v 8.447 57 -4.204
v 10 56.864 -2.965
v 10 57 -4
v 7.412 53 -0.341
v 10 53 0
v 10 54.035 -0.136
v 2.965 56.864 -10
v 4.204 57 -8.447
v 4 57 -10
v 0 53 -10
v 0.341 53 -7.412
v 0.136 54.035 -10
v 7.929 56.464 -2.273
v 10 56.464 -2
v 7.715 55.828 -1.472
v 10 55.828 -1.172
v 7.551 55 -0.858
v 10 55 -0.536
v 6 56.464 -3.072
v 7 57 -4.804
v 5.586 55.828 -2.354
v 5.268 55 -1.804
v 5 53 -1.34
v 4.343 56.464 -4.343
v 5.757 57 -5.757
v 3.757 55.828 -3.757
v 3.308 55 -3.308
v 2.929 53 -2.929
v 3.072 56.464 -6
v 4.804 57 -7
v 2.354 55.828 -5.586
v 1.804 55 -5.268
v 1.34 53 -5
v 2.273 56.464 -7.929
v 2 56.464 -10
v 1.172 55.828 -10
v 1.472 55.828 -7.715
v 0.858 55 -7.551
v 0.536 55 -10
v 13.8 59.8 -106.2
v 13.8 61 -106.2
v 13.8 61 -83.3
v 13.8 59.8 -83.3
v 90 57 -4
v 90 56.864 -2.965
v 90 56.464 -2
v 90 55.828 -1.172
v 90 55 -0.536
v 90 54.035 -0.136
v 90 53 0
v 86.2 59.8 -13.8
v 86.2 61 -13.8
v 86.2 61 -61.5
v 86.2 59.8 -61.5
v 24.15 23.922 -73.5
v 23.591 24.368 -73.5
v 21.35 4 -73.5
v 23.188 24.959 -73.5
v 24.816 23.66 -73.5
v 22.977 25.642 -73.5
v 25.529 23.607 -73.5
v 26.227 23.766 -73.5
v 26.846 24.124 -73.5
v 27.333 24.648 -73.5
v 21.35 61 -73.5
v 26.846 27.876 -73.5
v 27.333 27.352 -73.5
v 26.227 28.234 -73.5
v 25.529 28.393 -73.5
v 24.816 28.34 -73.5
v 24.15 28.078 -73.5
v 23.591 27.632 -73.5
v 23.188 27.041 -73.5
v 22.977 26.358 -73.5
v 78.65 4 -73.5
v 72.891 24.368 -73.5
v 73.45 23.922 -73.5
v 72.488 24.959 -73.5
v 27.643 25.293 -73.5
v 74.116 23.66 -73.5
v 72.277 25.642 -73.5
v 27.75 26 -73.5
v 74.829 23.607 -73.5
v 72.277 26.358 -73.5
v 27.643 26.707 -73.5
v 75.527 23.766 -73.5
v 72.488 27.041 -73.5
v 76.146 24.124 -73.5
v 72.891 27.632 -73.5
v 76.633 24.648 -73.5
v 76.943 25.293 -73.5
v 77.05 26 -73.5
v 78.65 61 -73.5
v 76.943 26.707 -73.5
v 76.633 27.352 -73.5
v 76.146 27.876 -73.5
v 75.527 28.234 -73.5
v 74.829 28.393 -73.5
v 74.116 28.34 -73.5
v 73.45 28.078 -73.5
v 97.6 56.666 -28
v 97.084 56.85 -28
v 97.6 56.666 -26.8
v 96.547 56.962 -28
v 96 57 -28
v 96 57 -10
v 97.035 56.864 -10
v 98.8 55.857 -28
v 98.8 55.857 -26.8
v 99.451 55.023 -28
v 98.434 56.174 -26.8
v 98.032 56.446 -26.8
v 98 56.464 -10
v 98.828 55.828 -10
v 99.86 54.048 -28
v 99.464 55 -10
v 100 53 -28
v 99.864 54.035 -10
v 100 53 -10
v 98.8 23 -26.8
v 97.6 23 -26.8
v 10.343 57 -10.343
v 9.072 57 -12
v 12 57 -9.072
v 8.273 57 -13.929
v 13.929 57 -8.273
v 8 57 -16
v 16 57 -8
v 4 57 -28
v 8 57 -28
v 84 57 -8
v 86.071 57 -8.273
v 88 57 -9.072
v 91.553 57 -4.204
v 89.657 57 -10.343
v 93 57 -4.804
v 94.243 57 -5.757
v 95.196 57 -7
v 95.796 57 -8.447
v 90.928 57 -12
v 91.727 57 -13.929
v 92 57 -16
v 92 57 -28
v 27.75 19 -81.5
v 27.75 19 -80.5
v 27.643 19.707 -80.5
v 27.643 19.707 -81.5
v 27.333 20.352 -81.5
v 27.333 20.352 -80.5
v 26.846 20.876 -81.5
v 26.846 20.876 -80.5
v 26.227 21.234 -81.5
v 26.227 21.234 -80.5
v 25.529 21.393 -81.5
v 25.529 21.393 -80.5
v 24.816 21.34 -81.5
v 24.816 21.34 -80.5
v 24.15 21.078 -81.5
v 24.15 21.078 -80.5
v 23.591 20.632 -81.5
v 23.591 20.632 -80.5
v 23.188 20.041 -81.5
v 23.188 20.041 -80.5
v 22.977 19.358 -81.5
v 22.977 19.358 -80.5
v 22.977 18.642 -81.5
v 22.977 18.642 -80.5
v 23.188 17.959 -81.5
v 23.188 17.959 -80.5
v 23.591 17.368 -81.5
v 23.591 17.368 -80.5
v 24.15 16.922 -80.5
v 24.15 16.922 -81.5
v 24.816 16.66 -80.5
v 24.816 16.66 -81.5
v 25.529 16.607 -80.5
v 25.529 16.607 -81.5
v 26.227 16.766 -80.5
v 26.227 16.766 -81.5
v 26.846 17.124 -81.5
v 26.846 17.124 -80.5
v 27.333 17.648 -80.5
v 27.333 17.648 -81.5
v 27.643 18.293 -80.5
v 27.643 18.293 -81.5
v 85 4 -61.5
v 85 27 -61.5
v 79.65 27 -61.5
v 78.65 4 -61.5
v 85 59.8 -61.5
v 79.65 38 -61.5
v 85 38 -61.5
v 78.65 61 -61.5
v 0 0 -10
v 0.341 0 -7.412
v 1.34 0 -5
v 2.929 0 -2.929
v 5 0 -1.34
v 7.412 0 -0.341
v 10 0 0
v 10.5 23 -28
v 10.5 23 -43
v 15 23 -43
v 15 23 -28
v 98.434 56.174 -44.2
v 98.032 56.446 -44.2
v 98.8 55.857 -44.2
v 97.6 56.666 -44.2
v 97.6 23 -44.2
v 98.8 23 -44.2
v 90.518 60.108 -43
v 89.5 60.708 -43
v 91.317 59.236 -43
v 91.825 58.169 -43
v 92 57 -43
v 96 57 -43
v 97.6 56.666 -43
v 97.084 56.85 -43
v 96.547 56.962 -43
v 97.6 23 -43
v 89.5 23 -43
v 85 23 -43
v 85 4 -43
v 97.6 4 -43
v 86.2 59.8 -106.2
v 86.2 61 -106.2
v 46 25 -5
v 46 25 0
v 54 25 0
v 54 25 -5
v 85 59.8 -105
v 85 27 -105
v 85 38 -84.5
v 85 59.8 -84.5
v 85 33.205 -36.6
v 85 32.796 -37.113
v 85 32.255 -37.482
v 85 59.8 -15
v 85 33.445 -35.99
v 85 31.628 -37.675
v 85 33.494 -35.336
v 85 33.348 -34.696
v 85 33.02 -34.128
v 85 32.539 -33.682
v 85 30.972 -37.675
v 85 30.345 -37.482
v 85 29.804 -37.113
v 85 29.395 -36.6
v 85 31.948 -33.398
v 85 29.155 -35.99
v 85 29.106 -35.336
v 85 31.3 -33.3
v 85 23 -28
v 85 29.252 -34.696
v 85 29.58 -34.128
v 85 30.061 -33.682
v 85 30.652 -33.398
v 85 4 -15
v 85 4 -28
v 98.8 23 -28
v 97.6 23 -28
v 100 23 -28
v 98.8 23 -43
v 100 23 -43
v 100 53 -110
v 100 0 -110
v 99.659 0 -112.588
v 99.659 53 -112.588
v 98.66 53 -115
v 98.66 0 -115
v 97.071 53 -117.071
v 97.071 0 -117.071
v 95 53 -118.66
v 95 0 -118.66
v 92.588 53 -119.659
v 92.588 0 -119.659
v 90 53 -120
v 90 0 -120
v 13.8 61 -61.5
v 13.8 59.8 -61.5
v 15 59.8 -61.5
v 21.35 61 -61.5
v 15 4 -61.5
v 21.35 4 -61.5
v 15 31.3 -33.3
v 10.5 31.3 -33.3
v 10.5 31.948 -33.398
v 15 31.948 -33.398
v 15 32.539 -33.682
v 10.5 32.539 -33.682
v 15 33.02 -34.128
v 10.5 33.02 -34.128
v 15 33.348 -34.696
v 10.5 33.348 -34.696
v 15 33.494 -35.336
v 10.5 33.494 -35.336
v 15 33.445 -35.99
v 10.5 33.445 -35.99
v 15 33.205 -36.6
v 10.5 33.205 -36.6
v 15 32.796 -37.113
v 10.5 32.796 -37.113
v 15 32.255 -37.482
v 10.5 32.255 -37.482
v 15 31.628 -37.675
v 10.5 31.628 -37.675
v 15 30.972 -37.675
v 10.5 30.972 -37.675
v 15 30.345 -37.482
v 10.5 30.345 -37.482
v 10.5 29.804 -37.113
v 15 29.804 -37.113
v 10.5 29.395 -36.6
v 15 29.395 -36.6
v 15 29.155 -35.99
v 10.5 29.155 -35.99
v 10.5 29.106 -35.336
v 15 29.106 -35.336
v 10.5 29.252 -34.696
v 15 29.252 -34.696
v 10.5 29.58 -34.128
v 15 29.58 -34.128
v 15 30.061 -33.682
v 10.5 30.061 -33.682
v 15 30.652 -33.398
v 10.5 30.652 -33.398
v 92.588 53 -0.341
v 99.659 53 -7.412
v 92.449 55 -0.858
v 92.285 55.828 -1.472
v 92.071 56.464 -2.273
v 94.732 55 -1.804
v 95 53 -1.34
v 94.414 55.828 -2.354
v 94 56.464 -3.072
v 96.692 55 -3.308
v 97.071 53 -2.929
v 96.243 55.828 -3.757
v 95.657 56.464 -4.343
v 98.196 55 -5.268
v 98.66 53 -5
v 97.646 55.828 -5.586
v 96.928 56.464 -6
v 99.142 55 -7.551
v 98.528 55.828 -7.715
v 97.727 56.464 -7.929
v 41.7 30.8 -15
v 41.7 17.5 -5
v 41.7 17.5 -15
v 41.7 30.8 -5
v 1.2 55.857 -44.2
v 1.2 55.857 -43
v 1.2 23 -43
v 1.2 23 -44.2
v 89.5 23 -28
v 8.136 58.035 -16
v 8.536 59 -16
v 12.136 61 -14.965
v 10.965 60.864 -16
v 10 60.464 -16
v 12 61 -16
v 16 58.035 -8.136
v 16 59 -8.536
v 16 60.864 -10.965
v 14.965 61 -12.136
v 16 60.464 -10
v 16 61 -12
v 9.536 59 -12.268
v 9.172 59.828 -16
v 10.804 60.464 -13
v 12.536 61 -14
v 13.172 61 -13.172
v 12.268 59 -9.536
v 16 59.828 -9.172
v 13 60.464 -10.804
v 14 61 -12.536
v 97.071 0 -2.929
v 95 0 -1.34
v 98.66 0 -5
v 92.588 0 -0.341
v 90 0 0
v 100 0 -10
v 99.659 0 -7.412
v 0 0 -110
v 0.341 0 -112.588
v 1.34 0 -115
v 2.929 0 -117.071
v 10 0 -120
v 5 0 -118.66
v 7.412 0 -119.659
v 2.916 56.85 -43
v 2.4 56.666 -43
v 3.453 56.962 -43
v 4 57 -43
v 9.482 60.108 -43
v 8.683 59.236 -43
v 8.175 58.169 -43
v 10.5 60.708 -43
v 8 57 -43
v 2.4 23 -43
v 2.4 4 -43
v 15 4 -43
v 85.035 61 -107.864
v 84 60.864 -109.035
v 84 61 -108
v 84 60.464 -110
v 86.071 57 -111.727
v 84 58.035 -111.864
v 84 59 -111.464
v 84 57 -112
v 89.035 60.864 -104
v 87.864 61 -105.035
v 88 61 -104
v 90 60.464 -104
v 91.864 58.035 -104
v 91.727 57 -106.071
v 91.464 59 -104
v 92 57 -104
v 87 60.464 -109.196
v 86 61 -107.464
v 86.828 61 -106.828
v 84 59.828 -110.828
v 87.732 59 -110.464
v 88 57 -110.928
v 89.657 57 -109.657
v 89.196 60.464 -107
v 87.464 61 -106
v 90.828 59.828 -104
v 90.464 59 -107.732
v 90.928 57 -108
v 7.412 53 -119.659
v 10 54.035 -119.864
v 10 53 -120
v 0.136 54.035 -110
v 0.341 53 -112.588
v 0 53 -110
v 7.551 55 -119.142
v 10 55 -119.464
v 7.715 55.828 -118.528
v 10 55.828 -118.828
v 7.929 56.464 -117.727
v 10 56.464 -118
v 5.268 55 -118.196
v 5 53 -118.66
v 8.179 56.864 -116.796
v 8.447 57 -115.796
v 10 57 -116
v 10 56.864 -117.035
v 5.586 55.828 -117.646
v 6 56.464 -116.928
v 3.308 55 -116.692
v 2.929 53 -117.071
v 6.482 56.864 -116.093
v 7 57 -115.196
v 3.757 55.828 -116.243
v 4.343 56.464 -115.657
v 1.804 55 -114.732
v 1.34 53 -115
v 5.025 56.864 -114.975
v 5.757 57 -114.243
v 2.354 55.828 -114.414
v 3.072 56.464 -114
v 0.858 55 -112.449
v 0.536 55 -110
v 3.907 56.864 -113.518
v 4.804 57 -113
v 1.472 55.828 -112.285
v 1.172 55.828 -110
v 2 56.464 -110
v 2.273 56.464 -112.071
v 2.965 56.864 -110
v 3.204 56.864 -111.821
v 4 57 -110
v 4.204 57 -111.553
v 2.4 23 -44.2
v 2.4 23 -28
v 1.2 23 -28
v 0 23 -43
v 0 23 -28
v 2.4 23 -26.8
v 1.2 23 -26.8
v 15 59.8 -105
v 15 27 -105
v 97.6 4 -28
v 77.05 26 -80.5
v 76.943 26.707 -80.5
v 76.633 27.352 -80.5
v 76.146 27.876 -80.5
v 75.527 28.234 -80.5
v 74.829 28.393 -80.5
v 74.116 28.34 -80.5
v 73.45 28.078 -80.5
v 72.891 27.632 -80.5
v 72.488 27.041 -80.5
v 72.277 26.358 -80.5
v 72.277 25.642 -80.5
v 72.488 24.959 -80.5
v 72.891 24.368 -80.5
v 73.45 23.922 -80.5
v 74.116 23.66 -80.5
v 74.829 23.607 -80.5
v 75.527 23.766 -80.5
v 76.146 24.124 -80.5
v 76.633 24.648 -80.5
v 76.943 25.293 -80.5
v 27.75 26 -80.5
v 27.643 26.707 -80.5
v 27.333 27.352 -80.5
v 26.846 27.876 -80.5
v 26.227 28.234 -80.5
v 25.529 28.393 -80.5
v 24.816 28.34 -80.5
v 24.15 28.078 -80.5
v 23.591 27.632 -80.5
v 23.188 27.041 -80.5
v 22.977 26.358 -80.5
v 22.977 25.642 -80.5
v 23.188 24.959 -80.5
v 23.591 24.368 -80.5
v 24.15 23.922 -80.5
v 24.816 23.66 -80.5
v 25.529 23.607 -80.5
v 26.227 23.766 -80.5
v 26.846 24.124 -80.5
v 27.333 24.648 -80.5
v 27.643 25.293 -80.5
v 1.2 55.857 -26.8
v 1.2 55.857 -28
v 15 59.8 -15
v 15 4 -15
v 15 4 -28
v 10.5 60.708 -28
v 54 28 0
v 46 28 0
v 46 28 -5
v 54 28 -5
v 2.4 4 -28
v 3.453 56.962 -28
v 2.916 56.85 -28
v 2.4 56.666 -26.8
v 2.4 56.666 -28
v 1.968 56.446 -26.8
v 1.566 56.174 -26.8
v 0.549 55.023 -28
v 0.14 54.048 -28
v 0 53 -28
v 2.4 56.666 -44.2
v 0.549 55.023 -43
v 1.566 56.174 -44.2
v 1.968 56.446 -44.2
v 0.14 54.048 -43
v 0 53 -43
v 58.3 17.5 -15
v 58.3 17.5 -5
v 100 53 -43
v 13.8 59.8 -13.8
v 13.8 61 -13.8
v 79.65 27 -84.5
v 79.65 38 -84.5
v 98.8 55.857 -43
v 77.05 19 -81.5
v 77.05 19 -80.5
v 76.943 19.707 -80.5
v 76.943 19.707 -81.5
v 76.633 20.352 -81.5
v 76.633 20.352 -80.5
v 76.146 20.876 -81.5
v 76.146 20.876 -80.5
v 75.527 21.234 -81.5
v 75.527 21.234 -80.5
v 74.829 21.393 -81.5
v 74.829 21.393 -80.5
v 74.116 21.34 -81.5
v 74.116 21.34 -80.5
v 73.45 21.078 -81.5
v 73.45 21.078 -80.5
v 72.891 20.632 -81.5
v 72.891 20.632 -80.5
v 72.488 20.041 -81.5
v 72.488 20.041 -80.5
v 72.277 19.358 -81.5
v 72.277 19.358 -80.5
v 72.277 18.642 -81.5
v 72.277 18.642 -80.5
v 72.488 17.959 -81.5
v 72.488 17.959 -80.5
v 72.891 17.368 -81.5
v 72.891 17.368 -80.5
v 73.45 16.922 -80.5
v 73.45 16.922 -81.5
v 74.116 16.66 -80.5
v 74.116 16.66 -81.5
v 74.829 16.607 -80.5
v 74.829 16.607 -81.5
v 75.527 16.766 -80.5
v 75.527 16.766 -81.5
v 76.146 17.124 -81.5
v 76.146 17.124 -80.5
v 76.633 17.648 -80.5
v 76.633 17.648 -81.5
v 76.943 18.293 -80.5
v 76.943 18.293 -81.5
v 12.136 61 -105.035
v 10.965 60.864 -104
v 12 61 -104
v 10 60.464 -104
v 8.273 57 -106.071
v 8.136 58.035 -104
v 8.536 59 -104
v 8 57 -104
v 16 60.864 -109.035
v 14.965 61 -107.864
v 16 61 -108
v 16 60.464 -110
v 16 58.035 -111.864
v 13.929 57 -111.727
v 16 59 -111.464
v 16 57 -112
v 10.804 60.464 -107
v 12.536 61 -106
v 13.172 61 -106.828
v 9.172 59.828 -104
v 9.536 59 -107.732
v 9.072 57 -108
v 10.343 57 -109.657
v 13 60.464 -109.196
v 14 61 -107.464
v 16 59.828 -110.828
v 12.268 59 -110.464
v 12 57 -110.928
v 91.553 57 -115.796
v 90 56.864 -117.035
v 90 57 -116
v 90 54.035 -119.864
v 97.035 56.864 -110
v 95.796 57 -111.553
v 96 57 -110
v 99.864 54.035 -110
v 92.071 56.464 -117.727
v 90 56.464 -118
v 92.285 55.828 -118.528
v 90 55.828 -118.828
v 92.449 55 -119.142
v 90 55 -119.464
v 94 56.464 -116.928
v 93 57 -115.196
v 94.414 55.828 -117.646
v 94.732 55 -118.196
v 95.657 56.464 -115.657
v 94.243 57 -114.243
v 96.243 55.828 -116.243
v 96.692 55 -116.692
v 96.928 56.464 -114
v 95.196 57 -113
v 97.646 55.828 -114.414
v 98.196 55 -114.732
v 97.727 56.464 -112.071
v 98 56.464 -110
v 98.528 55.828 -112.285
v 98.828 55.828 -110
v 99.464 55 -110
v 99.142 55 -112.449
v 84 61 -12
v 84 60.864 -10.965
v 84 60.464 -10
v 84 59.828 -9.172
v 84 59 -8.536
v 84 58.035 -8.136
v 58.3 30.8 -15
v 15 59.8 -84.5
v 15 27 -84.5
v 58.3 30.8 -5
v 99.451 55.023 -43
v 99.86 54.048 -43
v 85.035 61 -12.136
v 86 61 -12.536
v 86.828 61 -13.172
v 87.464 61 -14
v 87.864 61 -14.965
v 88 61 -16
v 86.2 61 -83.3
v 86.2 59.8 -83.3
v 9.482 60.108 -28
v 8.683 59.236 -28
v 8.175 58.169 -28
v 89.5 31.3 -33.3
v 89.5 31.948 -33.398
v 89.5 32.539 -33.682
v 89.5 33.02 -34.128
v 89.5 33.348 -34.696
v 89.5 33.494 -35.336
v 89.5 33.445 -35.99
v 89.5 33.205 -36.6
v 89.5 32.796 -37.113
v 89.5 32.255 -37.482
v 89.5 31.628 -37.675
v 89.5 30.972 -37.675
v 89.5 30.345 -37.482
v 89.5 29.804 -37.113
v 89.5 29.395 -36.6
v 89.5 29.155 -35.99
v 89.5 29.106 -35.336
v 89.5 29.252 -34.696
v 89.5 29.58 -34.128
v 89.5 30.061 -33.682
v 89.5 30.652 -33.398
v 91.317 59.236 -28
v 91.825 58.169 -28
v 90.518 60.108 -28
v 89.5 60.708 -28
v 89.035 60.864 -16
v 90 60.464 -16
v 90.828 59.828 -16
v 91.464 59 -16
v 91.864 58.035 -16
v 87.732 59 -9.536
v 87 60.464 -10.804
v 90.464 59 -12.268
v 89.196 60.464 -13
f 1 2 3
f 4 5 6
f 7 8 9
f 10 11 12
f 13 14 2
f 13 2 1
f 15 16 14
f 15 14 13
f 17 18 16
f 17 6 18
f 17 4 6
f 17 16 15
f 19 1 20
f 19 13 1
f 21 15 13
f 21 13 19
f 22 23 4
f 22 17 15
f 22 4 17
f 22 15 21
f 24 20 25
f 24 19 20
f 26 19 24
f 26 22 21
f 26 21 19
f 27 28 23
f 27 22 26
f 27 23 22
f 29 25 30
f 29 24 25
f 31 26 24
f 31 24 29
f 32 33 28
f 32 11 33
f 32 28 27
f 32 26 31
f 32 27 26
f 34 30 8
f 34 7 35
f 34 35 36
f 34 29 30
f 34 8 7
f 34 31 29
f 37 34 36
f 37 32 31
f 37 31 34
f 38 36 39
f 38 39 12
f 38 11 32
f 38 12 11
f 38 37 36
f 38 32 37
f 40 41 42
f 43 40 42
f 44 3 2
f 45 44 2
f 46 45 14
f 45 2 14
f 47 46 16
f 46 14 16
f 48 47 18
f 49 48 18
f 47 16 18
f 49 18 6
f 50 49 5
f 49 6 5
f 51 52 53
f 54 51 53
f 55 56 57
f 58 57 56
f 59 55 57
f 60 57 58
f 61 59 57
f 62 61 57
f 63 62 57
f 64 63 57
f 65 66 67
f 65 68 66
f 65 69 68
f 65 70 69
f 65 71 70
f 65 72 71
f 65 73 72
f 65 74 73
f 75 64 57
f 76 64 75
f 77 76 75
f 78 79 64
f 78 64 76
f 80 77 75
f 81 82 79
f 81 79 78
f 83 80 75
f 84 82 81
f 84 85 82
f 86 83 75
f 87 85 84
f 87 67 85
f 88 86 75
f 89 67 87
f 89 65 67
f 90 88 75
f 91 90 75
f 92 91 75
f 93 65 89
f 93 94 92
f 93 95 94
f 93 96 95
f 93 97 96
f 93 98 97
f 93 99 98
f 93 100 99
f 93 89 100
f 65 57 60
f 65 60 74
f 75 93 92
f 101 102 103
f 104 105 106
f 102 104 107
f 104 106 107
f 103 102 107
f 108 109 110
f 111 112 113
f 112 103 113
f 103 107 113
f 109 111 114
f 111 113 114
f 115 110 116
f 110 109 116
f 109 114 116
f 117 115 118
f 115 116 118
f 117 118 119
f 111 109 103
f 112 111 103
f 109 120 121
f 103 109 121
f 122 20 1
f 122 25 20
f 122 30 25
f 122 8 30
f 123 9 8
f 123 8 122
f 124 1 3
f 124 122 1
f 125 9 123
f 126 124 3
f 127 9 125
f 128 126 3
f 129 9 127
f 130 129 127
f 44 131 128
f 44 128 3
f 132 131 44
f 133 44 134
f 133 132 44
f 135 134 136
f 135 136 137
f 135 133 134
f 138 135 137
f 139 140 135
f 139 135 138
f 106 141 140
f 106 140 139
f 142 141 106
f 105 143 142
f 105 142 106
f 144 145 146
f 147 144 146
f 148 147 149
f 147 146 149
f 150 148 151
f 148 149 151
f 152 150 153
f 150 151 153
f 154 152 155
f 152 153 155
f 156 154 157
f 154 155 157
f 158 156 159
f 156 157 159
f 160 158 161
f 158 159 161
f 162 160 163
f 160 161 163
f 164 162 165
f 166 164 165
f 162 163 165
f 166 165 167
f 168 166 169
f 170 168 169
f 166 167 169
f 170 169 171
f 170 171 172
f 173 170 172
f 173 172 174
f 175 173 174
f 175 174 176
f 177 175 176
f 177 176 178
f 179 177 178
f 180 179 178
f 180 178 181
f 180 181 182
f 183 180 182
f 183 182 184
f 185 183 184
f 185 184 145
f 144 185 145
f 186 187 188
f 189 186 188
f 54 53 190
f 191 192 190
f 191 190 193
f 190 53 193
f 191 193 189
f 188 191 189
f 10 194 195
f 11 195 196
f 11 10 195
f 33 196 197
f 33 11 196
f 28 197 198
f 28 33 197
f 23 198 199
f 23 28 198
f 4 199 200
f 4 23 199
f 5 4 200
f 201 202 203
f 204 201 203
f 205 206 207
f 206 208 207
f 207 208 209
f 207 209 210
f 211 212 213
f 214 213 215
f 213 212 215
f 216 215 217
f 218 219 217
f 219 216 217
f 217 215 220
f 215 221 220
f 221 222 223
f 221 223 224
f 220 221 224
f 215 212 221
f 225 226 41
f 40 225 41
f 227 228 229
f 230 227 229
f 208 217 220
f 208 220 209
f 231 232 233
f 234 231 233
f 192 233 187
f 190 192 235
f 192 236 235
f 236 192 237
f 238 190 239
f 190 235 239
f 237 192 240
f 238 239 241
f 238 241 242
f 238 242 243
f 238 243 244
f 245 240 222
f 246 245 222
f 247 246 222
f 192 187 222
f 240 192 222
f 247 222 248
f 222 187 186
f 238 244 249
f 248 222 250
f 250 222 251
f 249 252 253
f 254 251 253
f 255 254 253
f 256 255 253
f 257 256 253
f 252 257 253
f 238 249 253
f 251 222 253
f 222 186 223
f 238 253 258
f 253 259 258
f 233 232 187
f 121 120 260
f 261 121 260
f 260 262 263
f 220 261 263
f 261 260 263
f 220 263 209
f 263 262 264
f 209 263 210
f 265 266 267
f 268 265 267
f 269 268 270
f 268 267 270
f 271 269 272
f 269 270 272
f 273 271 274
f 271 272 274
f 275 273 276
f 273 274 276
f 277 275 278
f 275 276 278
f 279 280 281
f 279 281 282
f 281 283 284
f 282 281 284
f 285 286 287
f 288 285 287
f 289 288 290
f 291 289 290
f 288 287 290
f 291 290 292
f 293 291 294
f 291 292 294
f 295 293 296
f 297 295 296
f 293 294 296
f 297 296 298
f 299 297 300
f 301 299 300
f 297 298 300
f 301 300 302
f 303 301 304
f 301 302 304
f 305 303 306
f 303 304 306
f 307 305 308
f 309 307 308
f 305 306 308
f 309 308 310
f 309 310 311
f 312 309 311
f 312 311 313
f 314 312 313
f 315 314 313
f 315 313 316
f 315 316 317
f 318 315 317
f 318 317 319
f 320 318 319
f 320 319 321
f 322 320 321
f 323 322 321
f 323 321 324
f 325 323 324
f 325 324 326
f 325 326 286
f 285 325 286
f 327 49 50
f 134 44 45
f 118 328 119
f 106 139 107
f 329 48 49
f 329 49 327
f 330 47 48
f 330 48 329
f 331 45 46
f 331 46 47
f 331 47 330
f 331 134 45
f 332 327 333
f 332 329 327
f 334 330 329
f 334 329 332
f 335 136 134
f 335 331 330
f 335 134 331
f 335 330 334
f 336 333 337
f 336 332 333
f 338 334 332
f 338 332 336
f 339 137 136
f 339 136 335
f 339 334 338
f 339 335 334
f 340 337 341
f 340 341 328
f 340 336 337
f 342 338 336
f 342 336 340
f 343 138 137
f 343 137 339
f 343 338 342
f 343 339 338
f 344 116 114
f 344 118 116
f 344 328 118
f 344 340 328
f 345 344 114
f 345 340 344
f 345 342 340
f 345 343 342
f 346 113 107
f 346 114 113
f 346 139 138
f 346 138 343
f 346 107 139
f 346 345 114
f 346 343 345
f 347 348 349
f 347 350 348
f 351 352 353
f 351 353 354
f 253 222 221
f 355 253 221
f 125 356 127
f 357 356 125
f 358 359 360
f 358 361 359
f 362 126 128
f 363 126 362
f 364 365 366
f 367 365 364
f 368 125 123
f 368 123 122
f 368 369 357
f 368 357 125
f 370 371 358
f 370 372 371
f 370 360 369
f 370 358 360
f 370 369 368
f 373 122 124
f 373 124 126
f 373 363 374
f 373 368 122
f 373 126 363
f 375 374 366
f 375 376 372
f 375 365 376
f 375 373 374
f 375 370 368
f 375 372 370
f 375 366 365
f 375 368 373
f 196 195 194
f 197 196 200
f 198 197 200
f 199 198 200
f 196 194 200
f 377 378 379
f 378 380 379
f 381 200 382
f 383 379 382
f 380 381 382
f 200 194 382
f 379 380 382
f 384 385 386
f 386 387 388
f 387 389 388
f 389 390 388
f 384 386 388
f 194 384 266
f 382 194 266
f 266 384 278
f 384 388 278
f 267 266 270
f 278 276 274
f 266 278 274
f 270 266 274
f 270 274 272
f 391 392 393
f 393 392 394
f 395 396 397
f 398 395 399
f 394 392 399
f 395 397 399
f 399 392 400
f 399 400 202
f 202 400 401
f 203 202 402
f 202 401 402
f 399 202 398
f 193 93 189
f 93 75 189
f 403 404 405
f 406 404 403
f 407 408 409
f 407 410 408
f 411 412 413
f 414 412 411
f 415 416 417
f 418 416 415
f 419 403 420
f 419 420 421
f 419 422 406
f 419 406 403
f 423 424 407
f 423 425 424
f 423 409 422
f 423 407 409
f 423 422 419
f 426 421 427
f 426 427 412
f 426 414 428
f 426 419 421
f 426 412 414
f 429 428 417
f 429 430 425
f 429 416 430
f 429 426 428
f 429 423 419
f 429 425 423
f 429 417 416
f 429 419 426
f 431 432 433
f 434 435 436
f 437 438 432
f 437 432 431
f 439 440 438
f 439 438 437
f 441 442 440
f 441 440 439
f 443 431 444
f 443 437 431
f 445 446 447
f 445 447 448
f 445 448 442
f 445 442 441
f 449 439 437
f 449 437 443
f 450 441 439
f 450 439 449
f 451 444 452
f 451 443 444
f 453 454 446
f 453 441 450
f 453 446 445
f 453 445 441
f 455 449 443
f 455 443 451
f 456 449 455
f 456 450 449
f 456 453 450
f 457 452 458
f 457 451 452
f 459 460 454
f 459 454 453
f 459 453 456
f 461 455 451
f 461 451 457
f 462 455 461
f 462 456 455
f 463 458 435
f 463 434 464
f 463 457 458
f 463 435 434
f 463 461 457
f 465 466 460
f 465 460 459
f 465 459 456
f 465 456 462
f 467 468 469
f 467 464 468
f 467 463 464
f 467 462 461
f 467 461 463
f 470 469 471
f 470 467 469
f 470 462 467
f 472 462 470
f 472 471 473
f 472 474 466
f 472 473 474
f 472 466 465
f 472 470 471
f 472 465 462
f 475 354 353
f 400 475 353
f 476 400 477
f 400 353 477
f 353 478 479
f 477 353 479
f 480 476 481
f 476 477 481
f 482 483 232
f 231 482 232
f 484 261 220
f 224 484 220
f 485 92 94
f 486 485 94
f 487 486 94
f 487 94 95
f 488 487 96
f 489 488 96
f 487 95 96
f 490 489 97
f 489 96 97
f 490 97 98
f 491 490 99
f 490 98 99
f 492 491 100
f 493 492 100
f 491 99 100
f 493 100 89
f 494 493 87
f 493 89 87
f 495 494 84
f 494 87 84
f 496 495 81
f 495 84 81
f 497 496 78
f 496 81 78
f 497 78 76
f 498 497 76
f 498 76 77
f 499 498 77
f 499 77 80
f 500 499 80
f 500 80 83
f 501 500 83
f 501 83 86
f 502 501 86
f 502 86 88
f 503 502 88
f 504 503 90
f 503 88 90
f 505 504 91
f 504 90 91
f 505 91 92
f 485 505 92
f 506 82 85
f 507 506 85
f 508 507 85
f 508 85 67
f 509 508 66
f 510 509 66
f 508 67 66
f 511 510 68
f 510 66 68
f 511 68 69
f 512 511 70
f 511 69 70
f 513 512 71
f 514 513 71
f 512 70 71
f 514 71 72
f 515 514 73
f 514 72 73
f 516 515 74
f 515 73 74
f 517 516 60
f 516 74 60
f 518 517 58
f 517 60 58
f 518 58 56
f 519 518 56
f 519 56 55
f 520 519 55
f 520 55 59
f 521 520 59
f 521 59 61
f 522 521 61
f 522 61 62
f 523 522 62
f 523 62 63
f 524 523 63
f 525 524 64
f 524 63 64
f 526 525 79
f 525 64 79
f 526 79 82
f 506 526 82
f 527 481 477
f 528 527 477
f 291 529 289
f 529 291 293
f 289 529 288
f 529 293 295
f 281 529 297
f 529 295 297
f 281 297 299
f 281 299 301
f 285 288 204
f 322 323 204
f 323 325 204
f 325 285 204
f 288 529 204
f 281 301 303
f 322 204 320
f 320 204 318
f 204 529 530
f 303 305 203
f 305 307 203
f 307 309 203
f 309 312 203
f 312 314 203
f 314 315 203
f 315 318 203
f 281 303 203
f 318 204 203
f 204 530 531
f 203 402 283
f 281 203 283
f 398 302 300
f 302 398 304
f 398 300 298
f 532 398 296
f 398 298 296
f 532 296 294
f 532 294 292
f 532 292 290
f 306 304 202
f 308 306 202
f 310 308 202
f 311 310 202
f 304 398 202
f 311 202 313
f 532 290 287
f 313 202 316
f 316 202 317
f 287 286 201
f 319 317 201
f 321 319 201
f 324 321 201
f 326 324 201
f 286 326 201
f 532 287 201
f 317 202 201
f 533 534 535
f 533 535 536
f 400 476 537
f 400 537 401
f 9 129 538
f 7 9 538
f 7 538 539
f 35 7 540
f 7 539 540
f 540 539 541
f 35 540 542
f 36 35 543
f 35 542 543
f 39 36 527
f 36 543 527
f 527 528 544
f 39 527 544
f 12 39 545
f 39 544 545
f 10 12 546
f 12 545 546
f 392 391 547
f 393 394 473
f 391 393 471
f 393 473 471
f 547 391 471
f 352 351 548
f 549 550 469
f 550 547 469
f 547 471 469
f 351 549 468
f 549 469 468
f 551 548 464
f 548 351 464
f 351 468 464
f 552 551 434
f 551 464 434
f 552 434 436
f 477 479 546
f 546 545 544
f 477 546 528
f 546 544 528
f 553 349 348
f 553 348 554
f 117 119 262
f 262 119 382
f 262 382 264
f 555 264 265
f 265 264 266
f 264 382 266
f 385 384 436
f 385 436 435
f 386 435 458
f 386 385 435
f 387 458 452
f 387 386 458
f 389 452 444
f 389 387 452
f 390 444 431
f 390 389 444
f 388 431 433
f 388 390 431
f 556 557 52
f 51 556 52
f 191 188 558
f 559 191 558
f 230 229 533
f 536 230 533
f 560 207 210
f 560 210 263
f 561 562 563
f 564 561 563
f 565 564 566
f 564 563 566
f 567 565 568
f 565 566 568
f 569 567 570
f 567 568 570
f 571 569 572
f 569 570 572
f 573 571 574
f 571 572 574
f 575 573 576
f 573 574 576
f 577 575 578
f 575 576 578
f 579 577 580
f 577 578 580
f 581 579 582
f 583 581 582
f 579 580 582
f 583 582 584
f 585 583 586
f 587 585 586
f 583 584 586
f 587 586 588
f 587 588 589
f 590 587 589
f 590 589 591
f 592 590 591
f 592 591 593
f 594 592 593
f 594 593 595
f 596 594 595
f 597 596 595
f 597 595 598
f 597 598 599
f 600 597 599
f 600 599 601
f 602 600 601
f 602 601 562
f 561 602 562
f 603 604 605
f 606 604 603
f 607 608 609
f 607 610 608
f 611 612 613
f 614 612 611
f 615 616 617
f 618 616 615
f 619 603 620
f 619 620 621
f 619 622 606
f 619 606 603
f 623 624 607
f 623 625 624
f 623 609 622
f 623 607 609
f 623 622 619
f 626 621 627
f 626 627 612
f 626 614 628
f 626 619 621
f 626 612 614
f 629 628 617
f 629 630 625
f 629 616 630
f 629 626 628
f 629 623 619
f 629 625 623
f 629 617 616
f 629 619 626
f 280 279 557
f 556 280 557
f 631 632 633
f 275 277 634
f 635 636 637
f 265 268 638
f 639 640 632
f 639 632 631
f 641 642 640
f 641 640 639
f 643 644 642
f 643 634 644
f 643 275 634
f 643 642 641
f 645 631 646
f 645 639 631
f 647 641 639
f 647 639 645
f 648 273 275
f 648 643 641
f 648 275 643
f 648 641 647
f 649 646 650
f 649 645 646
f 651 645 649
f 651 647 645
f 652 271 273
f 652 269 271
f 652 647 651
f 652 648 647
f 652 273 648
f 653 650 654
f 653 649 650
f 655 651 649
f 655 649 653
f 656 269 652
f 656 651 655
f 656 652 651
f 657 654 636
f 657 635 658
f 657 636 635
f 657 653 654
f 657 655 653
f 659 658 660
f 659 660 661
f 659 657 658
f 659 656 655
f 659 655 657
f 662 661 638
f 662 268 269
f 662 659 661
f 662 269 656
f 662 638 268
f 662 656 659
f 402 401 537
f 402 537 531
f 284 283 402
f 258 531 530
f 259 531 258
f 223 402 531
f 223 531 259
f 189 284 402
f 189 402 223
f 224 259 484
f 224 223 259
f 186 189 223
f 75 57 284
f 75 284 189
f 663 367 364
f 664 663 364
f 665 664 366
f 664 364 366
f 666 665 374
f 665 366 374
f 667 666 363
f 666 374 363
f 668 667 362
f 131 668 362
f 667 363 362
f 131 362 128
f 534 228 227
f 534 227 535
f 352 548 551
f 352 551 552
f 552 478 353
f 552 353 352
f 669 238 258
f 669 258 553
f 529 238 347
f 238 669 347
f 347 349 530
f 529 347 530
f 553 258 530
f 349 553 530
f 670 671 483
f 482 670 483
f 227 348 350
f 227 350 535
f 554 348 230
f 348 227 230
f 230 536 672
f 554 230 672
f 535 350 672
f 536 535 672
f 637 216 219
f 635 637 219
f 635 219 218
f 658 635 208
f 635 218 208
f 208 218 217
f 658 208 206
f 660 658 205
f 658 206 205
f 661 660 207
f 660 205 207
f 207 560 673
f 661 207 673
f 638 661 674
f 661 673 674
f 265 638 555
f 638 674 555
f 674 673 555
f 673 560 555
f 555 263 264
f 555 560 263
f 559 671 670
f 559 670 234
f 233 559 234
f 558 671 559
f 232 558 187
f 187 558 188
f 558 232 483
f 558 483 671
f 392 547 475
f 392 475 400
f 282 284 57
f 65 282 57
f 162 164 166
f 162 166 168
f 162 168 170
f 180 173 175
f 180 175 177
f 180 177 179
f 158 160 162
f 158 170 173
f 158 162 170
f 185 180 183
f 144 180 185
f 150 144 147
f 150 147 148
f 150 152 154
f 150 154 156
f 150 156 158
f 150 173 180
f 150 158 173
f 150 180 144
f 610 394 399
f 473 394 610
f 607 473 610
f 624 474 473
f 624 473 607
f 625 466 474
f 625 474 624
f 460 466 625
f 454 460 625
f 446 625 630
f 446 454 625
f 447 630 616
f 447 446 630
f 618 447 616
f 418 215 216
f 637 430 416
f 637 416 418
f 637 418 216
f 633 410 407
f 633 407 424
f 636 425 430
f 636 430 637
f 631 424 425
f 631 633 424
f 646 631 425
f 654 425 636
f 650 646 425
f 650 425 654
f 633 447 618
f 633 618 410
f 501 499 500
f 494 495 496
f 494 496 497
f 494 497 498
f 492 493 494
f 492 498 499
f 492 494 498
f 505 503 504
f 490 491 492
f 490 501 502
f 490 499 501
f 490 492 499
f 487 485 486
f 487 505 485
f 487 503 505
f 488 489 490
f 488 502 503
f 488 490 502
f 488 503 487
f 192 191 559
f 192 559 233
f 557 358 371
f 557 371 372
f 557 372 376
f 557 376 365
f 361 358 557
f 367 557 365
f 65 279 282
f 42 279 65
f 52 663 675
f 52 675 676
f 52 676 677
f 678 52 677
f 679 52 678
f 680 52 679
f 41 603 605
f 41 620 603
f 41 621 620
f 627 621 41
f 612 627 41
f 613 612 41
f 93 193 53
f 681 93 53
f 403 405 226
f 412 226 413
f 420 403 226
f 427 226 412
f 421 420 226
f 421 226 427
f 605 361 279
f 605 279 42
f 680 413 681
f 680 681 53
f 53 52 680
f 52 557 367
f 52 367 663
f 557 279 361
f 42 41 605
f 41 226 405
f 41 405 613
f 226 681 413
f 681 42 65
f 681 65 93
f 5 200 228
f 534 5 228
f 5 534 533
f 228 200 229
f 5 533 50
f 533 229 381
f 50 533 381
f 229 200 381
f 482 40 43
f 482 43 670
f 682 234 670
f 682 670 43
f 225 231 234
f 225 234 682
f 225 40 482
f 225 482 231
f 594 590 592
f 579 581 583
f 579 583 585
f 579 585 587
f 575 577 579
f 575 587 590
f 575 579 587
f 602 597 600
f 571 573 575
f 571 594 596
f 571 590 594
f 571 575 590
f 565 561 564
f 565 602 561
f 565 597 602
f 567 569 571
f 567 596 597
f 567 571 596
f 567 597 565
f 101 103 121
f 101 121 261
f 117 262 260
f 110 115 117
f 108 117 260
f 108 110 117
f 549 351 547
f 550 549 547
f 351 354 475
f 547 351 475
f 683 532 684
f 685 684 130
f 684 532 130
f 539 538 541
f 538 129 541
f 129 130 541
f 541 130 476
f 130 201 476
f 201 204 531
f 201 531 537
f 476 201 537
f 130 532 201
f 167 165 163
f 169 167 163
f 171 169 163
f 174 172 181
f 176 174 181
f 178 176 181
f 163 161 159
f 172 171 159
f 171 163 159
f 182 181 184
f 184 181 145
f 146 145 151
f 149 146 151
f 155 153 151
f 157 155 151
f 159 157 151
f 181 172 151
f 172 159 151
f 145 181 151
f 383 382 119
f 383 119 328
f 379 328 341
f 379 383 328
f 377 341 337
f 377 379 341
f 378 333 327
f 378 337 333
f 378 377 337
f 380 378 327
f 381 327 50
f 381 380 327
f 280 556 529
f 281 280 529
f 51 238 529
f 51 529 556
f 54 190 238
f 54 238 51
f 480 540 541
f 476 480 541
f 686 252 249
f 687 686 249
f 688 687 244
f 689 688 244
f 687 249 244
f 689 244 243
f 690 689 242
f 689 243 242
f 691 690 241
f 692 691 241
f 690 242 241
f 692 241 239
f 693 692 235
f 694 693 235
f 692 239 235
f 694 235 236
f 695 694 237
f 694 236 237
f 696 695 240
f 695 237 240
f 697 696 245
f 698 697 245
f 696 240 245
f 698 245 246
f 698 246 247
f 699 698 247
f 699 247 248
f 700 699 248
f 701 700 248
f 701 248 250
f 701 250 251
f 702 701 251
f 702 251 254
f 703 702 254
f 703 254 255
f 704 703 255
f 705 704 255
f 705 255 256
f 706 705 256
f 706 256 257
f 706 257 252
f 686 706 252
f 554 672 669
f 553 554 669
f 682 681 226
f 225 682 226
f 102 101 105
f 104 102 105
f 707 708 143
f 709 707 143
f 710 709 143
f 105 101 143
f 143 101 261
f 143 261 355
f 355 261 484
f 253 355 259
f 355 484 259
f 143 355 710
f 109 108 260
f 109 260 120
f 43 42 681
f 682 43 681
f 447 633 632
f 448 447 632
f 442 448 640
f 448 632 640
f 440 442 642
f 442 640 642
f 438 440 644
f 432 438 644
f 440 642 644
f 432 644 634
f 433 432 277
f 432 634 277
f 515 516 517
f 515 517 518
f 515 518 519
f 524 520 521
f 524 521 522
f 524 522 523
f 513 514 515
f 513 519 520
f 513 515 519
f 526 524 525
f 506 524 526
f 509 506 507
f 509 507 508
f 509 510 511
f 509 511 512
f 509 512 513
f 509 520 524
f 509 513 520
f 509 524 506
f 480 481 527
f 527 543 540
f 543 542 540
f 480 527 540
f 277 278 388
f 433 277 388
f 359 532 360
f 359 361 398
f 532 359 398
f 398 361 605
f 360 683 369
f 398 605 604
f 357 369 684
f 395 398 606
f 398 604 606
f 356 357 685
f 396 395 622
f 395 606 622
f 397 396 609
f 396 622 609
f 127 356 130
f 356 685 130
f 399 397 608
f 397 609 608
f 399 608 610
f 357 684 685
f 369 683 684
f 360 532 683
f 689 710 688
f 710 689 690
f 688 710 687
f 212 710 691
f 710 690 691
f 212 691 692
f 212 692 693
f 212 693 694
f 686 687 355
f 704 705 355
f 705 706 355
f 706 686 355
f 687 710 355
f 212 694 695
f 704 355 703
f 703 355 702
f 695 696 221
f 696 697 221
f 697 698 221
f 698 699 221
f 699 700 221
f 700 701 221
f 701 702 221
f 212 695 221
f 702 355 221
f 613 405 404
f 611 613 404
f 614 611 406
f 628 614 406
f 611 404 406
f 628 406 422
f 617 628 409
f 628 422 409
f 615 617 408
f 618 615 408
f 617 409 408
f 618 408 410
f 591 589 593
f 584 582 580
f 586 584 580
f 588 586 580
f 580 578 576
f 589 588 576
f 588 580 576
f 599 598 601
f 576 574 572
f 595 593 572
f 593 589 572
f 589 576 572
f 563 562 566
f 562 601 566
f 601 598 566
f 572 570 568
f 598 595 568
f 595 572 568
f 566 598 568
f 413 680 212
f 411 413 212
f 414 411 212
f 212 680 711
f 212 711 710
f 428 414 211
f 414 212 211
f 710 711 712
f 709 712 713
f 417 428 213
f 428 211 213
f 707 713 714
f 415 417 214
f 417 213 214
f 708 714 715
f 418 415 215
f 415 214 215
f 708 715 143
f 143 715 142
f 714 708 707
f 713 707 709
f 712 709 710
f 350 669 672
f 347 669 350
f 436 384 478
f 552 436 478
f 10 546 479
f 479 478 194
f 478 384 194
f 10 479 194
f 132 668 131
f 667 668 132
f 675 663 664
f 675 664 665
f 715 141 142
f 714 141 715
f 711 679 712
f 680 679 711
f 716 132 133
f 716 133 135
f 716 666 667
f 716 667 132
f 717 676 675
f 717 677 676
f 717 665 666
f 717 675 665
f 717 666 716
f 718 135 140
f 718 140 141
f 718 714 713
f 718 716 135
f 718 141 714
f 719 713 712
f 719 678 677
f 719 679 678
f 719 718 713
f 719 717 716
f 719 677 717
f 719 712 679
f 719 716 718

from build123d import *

# Parameters (mm, degrees)
SKICA2_W                  = 100
SKICA2_H                  = 120
P_IDAT_VYSUNUT_M1_DEPTH   = 4
SKICA3_W                  = 15
SKICA3_H                  = 15
SKICA3_W_2                = 70
SKICA3_W_3                = 57.3
SKICA3_H_2                = 3
P_IDAT_VYSUNUT_M2_DEPTH   = 50
SKICA4_W                  = 70
SKICA4_H                  = 20.5
P_IDAT_VYSUNUT_M3_DEPTH   = 23
SKICA8_W                  = 6.35
SKICA8_H                  = 6
ODEBRAT_VYSUNUT_M1_DEPTH  = 23
SKICA9_W                  = 6.35
SKICA9_H                  = 2
P_IDAT_VYSUNUT_M5_DEPTH   = 6
SKICA10_R                 = 2.4
ODEBRAT_VYSUNUT_M2_DEPTH  = 8
SKICA11_W                 = 16.6
SKICA11_H                 = 11.8
ODEBRAT_VYSUNUT_M5_DEPTH  = 10
SKICA14_W                 = 8
SKICA14_H                 = 3
ODEBRAT_VYSUNUT_M6_DEPTH  = 5
SKICA15_W                 = 100
SKICA15_H                 = 120
SKICA15_W_2               = 84
SKICA15_H_2               = 104
ODEBRAT_VYSUNUT_M7_DEPTH  = 4
SKICA20_W                 = 15
SKICA20_H                 = 31
ODEBRAT_VYSUNUT_M8_DEPTH  = 10
SKICA21_W                 = 15
SKICA21_H                 = 31
ODEBRAT_VYSUNUT_M10_DEPTH = 10
SKICA22_R                 = 2.2
ODEBRAT_VYSUNUT_M11_DEPTH = 3
ODEBRAT_START             = -3
SKICA23_R                 = 2.2
ODEBRAT_VYSUNUT_M12_DEPTH = 3
SKICA24_W                 = 1.2
SKICA24_H                 = 1.2
ODEBRAT_VYSUNUT_M14_DEPTH = 27
SKICA26_W                 = 12.6
SKICA26_H                 = 15
ODEBRAT_VYSUNUT_M16_DEPTH = 19
SKICA32_R                 = 2.2
ODEBRAT_VYSUNUT_M19_DEPTH = 158.749801902
SKICA33_W                 = 2
SKICA33_H                 = 6
ODEBRAT_VYSUNUT_M20_DEPTH = 6.35
SKICA35_W                 = 16.6
SKICA35_H                 = 10
ODEBRAT_VYSUNUT_M21_DEPTH = 1.5
SKICA38_W                 = 1
SKICA38_H                 = 23
P_IDAT_VYSUNUT_M9_DEPTH   = 15
SKICA39_W                 = 5.35
SKICA39_H                 = 5
ODEBRAT_VYSUNUT_M23_DEPTH = 23
SKICA40_W                 = 15
SKICA40_H                 = 31
ODEBRAT_VYSUNUT_M24_DEPTH = 0.5
SKICA41_W                 = 15
SKICA41_H                 = 31
ODEBRAT_VYSUNUT_M25_DEPTH = 0.5
SKICA43_W                 = 70
SKICA43_H                 = 20.5
P_IDAT_VYSUNUT_M10_DEPTH  = 7
P_IDAT_VYSUNUT_M11_DEPTH  = 7
SKICA45_W                 = 70
SKICA45_H                 = 1.2
SKICA45_H_2               = 20.5
SKICA45_W_2               = 1.2
SKICA45_H_3               = 46.5
ODEBRAT_VYSUNUT_M26_DEPTH = 1.2
ZAOBLIT1_R                = 10
ZAOBLIT2_R                = 8
ZAOBLIT3_R                = 4
SKICA47_R                 = 2.4
P_IDAT_VYSUNUT_M13_DEPTH  = 7
SKICA47_3_R               = 2.4
ODEBRAT_VYSUNUT_M27_DEPTH = 7


with BuildPart() as part:
    # Skica2 → Přidat vysunutím1 (new body)
    with BuildSketch(Plane(origin=(0, 0, 0), x_dir=(1, 0, 0), z_dir=(0, 1, 0))):
        with Locations((50, 60)):
            Rectangle(SKICA2_W, SKICA2_H)
    extrude(amount=P_IDAT_VYSUNUT_M1_DEPTH)

    # Skica3 → Přidat vysunutím2 (add)
    with BuildSketch(Plane(origin=(0, 4, 0), x_dir=(1, 0, 0), z_dir=(0, 1, 0))):
        with Locations((7.5, 112.5)):
            Rectangle(SKICA3_W, SKICA3_H)
        with Locations((50, 112.5)):
            Rectangle(SKICA3_W_2, SKICA3_H)
        Polygon((15, 105), (0, 105), (0, 15), (15, 15), (15, 61.5), (15, 76.5), (15, 84.5), align=None)
        with Locations((92.5, 112.5)):
            Rectangle(SKICA3_W, SKICA3_H)
        Polygon((100, 105), (85, 105), (85, 84.5), (85, 76.5), (85, 61.5), (85, 15), (100, 15), align=None)
        Polygon((85, 84.5), (15, 84.5), (15, 76.5), (21.35, 76.5), (78.65, 76.5), (85, 76.5), align=None)
        with Locations((7.5, 7.5)):
            Rectangle(SKICA3_W, SKICA3_H)
        with Locations((50, 7.5)):
            Rectangle(SKICA3_W_2, SKICA3_H)
        with Locations((92.5, 7.5)):
            Rectangle(SKICA3_W, SKICA3_H)
        Polygon((21.35, 76.5), (15, 76.5), (15, 61.5), (21.35, 61.5), (21.35, 73.5), align=None)
        with Locations((50, 75)):
            Rectangle(SKICA3_W_3, SKICA3_H_2)
        Polygon((85, 61.5), (85, 76.5), (78.65, 76.5), (78.65, 73.5), (78.65, 61.5), align=None)
    extrude(amount=P_IDAT_VYSUNUT_M2_DEPTH)

    # Skica4 → Přidat vysunutím3 (add)
    with BuildSketch(Plane(origin=(0, 4, 0), x_dir=(1, 0, 0), z_dir=(0, 1, 0))):
        with Locations((50, 94.75)):
            Rectangle(SKICA4_W, SKICA4_H)
    extrude(amount=P_IDAT_VYSUNUT_M3_DEPTH)

    # Skica8 → Odebrat vysunutím1 (cut)
    with BuildSketch(Plane.XY.offset(-61.5)):
        with Locations((81.825, 30)):
            Rectangle(SKICA8_W, SKICA8_H)
    extrude(amount=-ODEBRAT_VYSUNUT_M1_DEPTH, mode=Mode.SUBTRACT)

    # Skica9 → Přidat vysunutím5 (add)
    with BuildSketch(Plane(origin=(0, 27, 0), x_dir=(1, 0, 0), z_dir=(0, 1, 0))):
        with Locations((81.825, 62.5)):
            Rectangle(SKICA9_W, SKICA9_H)
    extrude(amount=P_IDAT_VYSUNUT_M5_DEPTH)

    # Skica10 → Odebrat vysunutím2 (cut)
    with BuildSketch(Plane.XY.offset(-73.5)):
        with Locations((25.35, 19)):
            Circle(SKICA10_R)
        with Locations((74.65, 19)):
            Circle(SKICA10_R)
    extrude(amount=-ODEBRAT_VYSUNUT_M2_DEPTH, mode=Mode.SUBTRACT)

    # Skica11 → Odebrat vysunutím5 (cut)
    with BuildSketch(Plane(origin=(0, 0, -15), x_dir=(-1, 0, 0), z_dir=(0, 0, -1))):
        with Locations((-50, 24.9)):
            Rectangle(SKICA11_W, SKICA11_H)
    extrude(amount=-ODEBRAT_VYSUNUT_M5_DEPTH, mode=Mode.SUBTRACT)

    # Skica14 → Odebrat vysunutím6 (cut)
    with BuildSketch(Plane.XY):
        with Locations((50, 26.5)):
            Rectangle(SKICA14_W, SKICA14_H)
    extrude(amount=-ODEBRAT_VYSUNUT_M6_DEPTH, mode=Mode.SUBTRACT)

    # Skica15 → Odebrat vysunutím7 (cut)
    with BuildSketch(Plane(origin=(0, 54, 0), x_dir=(1, 0, 0), z_dir=(0, 1, 0))):
        with Locations((50, 60)):
            Rectangle(SKICA15_W, SKICA15_H)
        with Locations((50, 60)):
            Rectangle(SKICA15_W_2, SKICA15_H_2, mode=Mode.SUBTRACT)
    extrude(amount=-ODEBRAT_VYSUNUT_M7_DEPTH, mode=Mode.SUBTRACT)

    # Skica20 → Odebrat vysunutím8 (cut)
    with BuildSketch(Plane.ZY):
        with Locations((-35.5, 38.5)):
            Rectangle(SKICA20_W, SKICA20_H)
    extrude(amount=-ODEBRAT_VYSUNUT_M8_DEPTH, mode=Mode.SUBTRACT)

    # Skica21 → Odebrat vysunutím10 (cut)
    with BuildSketch(Plane(origin=(100, 0, 0), x_dir=(0, 0, -1), z_dir=(1, 0, 0))):
        with Locations((35.5, 38.5)):
            Rectangle(SKICA21_W, SKICA21_H)
    extrude(amount=-ODEBRAT_VYSUNUT_M10_DEPTH, mode=Mode.SUBTRACT)

    # Skica22 → Odebrat vysunutím11 (cut)
    with BuildSketch(Plane.ZY.offset(-10)):
        with Locations((-35.5, 31.3)):
            Circle(SKICA22_R)
    extrude(amount=-ODEBRAT_VYSUNUT_M11_DEPTH, mode=Mode.SUBTRACT)

    # Skica23 → Odebrat vysunutím12 (cut)
    with BuildSketch(Plane(origin=(90, 0, 0), x_dir=(0, 0, -1), z_dir=(1, 0, 0)).offset(ODEBRAT_START)):
        with Locations(Location((35.5, 31.3, 0), (0, 0, 180))):
            Circle(SKICA23_R)
    extrude(amount=ODEBRAT_VYSUNUT_M12_DEPTH, mode=Mode.SUBTRACT)

    # Skica24 → Odebrat vysunutím14 (cut)
    with BuildSketch(Plane(origin=(0, 50, 0), x_dir=(1, 0, 0), z_dir=(0, 1, 0))):
        with Locations((1.8, 27.4)):
            Rectangle(SKICA24_W, SKICA24_H)
        with Locations((1.8, 43.6)):
            Rectangle(SKICA24_W, SKICA24_H)
        with Locations((98.2, 27.4)):
            Rectangle(SKICA24_W, SKICA24_H)
        with Locations((98.2, 43.6)):
            Rectangle(SKICA24_W, SKICA24_H)
    extrude(amount=-ODEBRAT_VYSUNUT_M14_DEPTH, mode=Mode.SUBTRACT)

    # Skica26 → Odebrat vysunutím16 (cut)
    with BuildSketch(Plane(origin=(0, 23, 0), x_dir=(1, 0, 0), z_dir=(0, 1, 0))):
        with Locations((8.7, 35.5)):
            Rectangle(SKICA26_W, SKICA26_H)
        with Locations((91.3, 35.5)):
            Rectangle(SKICA26_W, SKICA26_H)
    extrude(amount=-ODEBRAT_VYSUNUT_M16_DEPTH, mode=Mode.SUBTRACT)

    # Skica32 → Odebrat vysunutím19 (cut, through all)
    with BuildSketch(Plane.ZY.offset(-13)):
        with Locations((-35.5, 31.3)):
            Circle(SKICA32_R)
    extrude(amount=-ODEBRAT_VYSUNUT_M19_DEPTH, mode=Mode.SUBTRACT)

    # Skica33 → Odebrat vysunutím20 (cut)
    with BuildSketch(Plane.ZY.offset(-78.65)):
        with Locations((-62.5, 30)):
            Rectangle(SKICA33_W, SKICA33_H)
    extrude(amount=-ODEBRAT_VYSUNUT_M20_DEPTH, mode=Mode.SUBTRACT)

    # Skica35 → Odebrat vysunutím21 (cut)
    with BuildSketch(Plane(origin=(0, 19, 0), x_dir=(1, 0, 0), z_dir=(0, 1, 0))):
        with Locations((50, 10)):
            Rectangle(SKICA35_W, SKICA35_H)
    extrude(amount=-ODEBRAT_VYSUNUT_M21_DEPTH, mode=Mode.SUBTRACT)

    # Skica38 → Přidat vysunutím9 (add)
    with BuildSketch(Plane(origin=(0, 27, 0), x_dir=(1, 0, 0), z_dir=(0, 1, 0))):
        with Locations((79.15, 73)):
            Rectangle(SKICA38_W, SKICA38_H)
    extrude(amount=P_IDAT_VYSUNUT_M9_DEPTH)

    # Skica39 → Odebrat vysunutím23 (cut)
    with BuildSketch(Plane.XY.offset(-61.5)):
        with Locations((82.325, 35.5)):
            Rectangle(SKICA39_W, SKICA39_H)
    extrude(amount=-ODEBRAT_VYSUNUT_M23_DEPTH, mode=Mode.SUBTRACT)

    # Skica40 → Odebrat vysunutím24 (cut)
    with BuildSketch(Plane.ZY.offset(-10)):
        with Locations((-35.5, 38.5)):
            Rectangle(SKICA40_W, SKICA40_H)
    extrude(amount=-ODEBRAT_VYSUNUT_M24_DEPTH, mode=Mode.SUBTRACT)

    # Skica41 → Odebrat vysunutím25 (cut)
    with BuildSketch(Plane(origin=(90, 0, 0), x_dir=(0, 0, -1), z_dir=(1, 0, 0))):
        with Locations((35.5, 38.5)):
            Rectangle(SKICA41_W, SKICA41_H)
    extrude(amount=-ODEBRAT_VYSUNUT_M25_DEPTH, mode=Mode.SUBTRACT)

    # Skica43 → Přidat vysunutím10 (add)
    with BuildSketch(Plane(origin=(0, 54, 0), x_dir=(1, 0, 0), z_dir=(0, 1, 0))):
        Polygon((92, 8), (92, 28), (89.5, 28), (89.5, 43), (92, 43), (92, 112), (8, 112), (8, 43), (10.5, 43), (10.5, 28), (8, 28), (8, 8), align=None)
        with Locations((50, 94.75)):
            Rectangle(SKICA43_W, SKICA43_H, mode=Mode.SUBTRACT)
        Polygon((78.65, 73.5), (78.65, 61.5), (85, 61.5), (85, 15), (15, 15), (15, 61.5), (21.35, 61.5), (21.35, 73.5), align=None, mode=Mode.SUBTRACT)
    extrude(amount=P_IDAT_VYSUNUT_M10_DEPTH)

    # Skica44 → Přidat vysunutím11 (add)
    with BuildSketch(Plane(origin=(0, 50, 0), x_dir=(1, 0, 0), z_dir=(0, 1, 0))):
        Polygon((0, 120), (0, 43), (1.2, 43), (1.2, 44.2), (2.4, 44.2), (2.4, 43), (8, 43), (8, 112), (92, 112), (92, 43), (97.6, 43), (97.6, 44.2), (98.8, 44.2), (98.8, 43), (100, 43), (100, 120), align=None)
        Polygon((1.2, 28), (0, 28), (0, 0), (100, 0), (100, 28), (98.8, 28), (98.8, 26.8), (97.6, 26.8), (97.6, 28), (92, 28), (92, 8), (8, 8), (8, 28), (2.4, 28), (2.4, 26.8), (1.2, 26.8), align=None)
    extrude(amount=P_IDAT_VYSUNUT_M11_DEPTH)

    # Skica45 → Odebrat vysunutím26 (cut)
    with BuildSketch(Plane(origin=(0, 61, 0), x_dir=(1, 0, 0), z_dir=(0, 1, 0))):
        with Locations((50, 105.6)):
            Rectangle(SKICA45_W, SKICA45_H)
        Polygon((15, 84.5), (15, 105), (15, 106.2), (13.8, 106.2), (13.8, 84.5), align=None)
        with Locations((50, 94.75)):
            Rectangle(SKICA45_W, SKICA45_H_2)
        Polygon((85, 106.2), (85, 105), (85, 84.5), (85, 83.3), (86.2, 83.3), (86.2, 106.2), align=None)
        Polygon((85, 84.5), (15, 84.5), (13.8, 84.5), (13.8, 83.3), (85, 83.3), align=None)
        Polygon((85, 15), (15, 15), (13.8, 15), (13.8, 13.8), (85, 13.8), align=None)
        with Locations((14.4, 38.25)):
            Rectangle(SKICA45_W_2, SKICA45_H_3)
        Polygon((85, 61.5), (85, 15), (85, 13.8), (86.2, 13.8), (86.2, 61.5), align=None)
    extrude(amount=-ODEBRAT_VYSUNUT_M26_DEPTH, mode=Mode.SUBTRACT)

    # Zaoblit1
    zaoblit1_edges = [part.edges().sort_by_distance(p)[0] for p in [
        (0, 28.5, -120),
        (100, 28.5, -120),
        (100, 28.5, 0),
        (0, 28.5, 0),
    ]]
    fillet(zaoblit1_edges, radius=ZAOBLIT1_R)

    # Zaoblit2
    zaoblit2_edges = [part.edges().sort_by_distance(p)[0] for p in [
        (92, 59, -8),
        (8, 59, -8),
        (8, 59, -112),
        (92, 59, -112),
    ]]
    fillet(zaoblit2_edges, radius=ZAOBLIT2_R)

    # Zaoblit3
    # the kernel refuses this fillet: 4 mm, written as the material it takes off along each edge
    with BuildSketch(Plane(origin=(8, 61, -104), x_dir=(1, 0, 0), z_dir=(0, 0, 1)), Plane(origin=(92, 61, -33), x_dir=(-1, 0, 0), z_dir=(0, 0, -1))) as zaoblit3_piece_1:
        with BuildLine():
            CenterArc((ZAOBLIT3_R, -ZAOBLIT3_R), ZAOBLIT3_R, 90, 90)
            Line((0, -ZAOBLIT3_R), (0, 0))
            Line((0, 0), (ZAOBLIT3_R, 0))
        make_face()
    extrude(amount=71, mode=Mode.SUBTRACT)
    with BuildSketch(Plane(origin=(100, 57, -10), x_dir=(-1, 0, 0), z_dir=(0, 0, -1)), Plane(origin=(0, 57, -38), x_dir=(1, 0, 0), z_dir=(0, 0, 1))) as zaoblit3_piece_2:
        with BuildLine():
            CenterArc((ZAOBLIT3_R, -ZAOBLIT3_R), ZAOBLIT3_R, 90, 90)
            Line((0, -ZAOBLIT3_R), (0, 0))
            Line((0, 0), (ZAOBLIT3_R, 0))
        make_face()
    extrude(amount=28, mode=Mode.SUBTRACT)
    with BuildSketch(Plane(origin=(100, 57, -33), x_dir=(0, -1, 0), z_dir=(0, 0, -1)), Plane(origin=(0, 57, -110), x_dir=(0, -1, 0), z_dir=(0, 0, 1))) as zaoblit3_piece_3:
        with BuildLine():
            CenterArc((ZAOBLIT3_R, ZAOBLIT3_R), ZAOBLIT3_R, 180, 90)
            Line((0, ZAOBLIT3_R), (0, 0))
            Line((0, 0), (ZAOBLIT3_R, 0))
        make_face()
    extrude(amount=77, mode=Mode.SUBTRACT)
    with BuildSketch(Plane(origin=(10, 57, 0), x_dir=(0, 0, -1), z_dir=(1, 0, 0)), Plane(origin=(90, 57, -120), x_dir=(0, 0, 1), z_dir=(-1, 0, 0))) as zaoblit3_piece_4:
        with BuildLine():
            CenterArc((ZAOBLIT3_R, -ZAOBLIT3_R), ZAOBLIT3_R, 90, 90)
            Line((0, -ZAOBLIT3_R), (0, 0))
            Line((0, 0), (ZAOBLIT3_R, 0))
        make_face()
    extrude(amount=80, mode=Mode.SUBTRACT)
    with BuildSketch(Plane(origin=(10, 57, -10), x_dir=(0, 0, 1), z_dir=(1, 0, 0))) as zaoblit3_piece_5:
        with BuildLine():
            CenterArc((10 - ZAOBLIT3_R, ZAOBLIT3_R), ZAOBLIT3_R, 270, 90)
            Line((10, ZAOBLIT3_R), (10, 0))
            Line((10, 0), (10 - ZAOBLIT3_R, 0))
        make_face()
    revolve(axis=Axis((10, 57, -10), (0, -1, 0)), revolution_arc=90, mode=Mode.SUBTRACT)
    with BuildSketch(Plane(origin=(90, 57, -10), x_dir=(0, 0, 1), z_dir=(-1, 0, 0))) as zaoblit3_piece_6:
        with BuildLine():
            CenterArc((10 - ZAOBLIT3_R, -ZAOBLIT3_R), ZAOBLIT3_R, 0, 90)
            Line((10, -ZAOBLIT3_R), (10, 0))
            Line((10, 0), (10 - ZAOBLIT3_R, 0))
        make_face()
    revolve(axis=Axis((90, 57, -10), (0, 1, 0)), revolution_arc=90, mode=Mode.SUBTRACT)
    with BuildSketch(Plane(origin=(10, 57, -110), x_dir=(0, 0, -1), z_dir=(1, 0, 0))) as zaoblit3_piece_7:
        with BuildLine():
            CenterArc((10 - ZAOBLIT3_R, -ZAOBLIT3_R), ZAOBLIT3_R, 0, 90)
            Line((10, -ZAOBLIT3_R), (10, 0))
            Line((10, 0), (10 - ZAOBLIT3_R, 0))
        make_face()
    revolve(axis=Axis((10, 57, -110), (0, 1, 0)), revolution_arc=90, mode=Mode.SUBTRACT)
    with BuildSketch(Plane(origin=(90, 57, -110), x_dir=(0, 0, -1), z_dir=(-1, 0, 0))) as zaoblit3_piece_8:
        with BuildLine():
            CenterArc((10 - ZAOBLIT3_R, ZAOBLIT3_R), ZAOBLIT3_R, 270, 90)
            Line((10, ZAOBLIT3_R), (10, 0))
            Line((10, 0), (10 - ZAOBLIT3_R, 0))
        make_face()
    revolve(axis=Axis((90, 57, -110), (0, -1, 0)), revolution_arc=90, mode=Mode.SUBTRACT)
    with BuildSketch(Plane(origin=(16, 61, -8), x_dir=(0, -1, 0), z_dir=(1, 0, 0))) as zaoblit3_piece_9:
        with BuildLine():
            CenterArc((ZAOBLIT3_R, ZAOBLIT3_R), ZAOBLIT3_R, 180, 90)
            Line((0, ZAOBLIT3_R), (0, 0))
            Line((0, 0), (ZAOBLIT3_R, 0))
        make_face()
    extrude(amount=68, mode=Mode.SUBTRACT)
    with BuildSketch(Plane(origin=(84, 61, -112), x_dir=(0, 0, 1), z_dir=(-1, 0, 0))) as zaoblit3_piece_10:
        with BuildLine():
            CenterArc((ZAOBLIT3_R, -ZAOBLIT3_R), ZAOBLIT3_R, 90, 90)
            Line((0, -ZAOBLIT3_R), (0, 0))
            Line((0, 0), (ZAOBLIT3_R, 0))
        make_face()
    extrude(amount=68, mode=Mode.SUBTRACT)
    with BuildSketch(Plane(origin=(84, 61, -16), x_dir=(0, 0, 1), z_dir=(-1, 0, 0))) as zaoblit3_piece_11:
        with BuildLine():
            CenterArc((8 - ZAOBLIT3_R, -ZAOBLIT3_R), ZAOBLIT3_R, 0, 90)
            Line((8 - ZAOBLIT3_R, 0), (8, 0))
            Line((8, 0), (8, -ZAOBLIT3_R))
        make_face()
    revolve(axis=Axis((84, 61, -16), (0, 1, 0)), revolution_arc=90, mode=Mode.SUBTRACT)
    with BuildSketch(Plane(origin=(84, 61, -104), x_dir=(0, 0, -1), z_dir=(-1, 0, 0))) as zaoblit3_piece_12:
        with BuildLine():
            CenterArc((8 - ZAOBLIT3_R, ZAOBLIT3_R), ZAOBLIT3_R, 270, 90)
            Line((8, ZAOBLIT3_R), (8, 0))
            Line((8, 0), (8 - ZAOBLIT3_R, 0))
        make_face()
    revolve(axis=Axis((84, 61, -104), (0, -1, 0)), revolution_arc=90, mode=Mode.SUBTRACT)
    with BuildSketch(Plane(origin=(16, 61, -104), x_dir=(-1, 0, 0), z_dir=(0, 0, 1))) as zaoblit3_piece_13:
        with BuildLine():
            CenterArc((8 - ZAOBLIT3_R, ZAOBLIT3_R), ZAOBLIT3_R, 270, 90)
            Line((8, ZAOBLIT3_R), (8, 0))
            Line((8, 0), (8 - ZAOBLIT3_R, 0))
        make_face()
    revolve(axis=Axis((16, 61, -104), (0, -1, 0)), revolution_arc=90, mode=Mode.SUBTRACT)
    with BuildSketch(Plane(origin=(16, 61, -16), x_dir=(-1, 0, 0), z_dir=(0, 0, -1))) as zaoblit3_piece_14:
        with BuildLine():
            CenterArc((8 - ZAOBLIT3_R, -ZAOBLIT3_R), ZAOBLIT3_R, 0, 90)
            Line((8 - ZAOBLIT3_R, 0), (8, 0))
            Line((8, 0), (8, -ZAOBLIT3_R))
        make_face()
    revolve(axis=Axis((16, 61, -16), (0, 1, 0)), revolution_arc=90, mode=Mode.SUBTRACT)
    with BuildSketch(Plane(origin=(8, 61, -38), x_dir=(0, -1, 0), z_dir=(0, 0, 1)), Plane(origin=(92, 61, -16), x_dir=(0, -1, 0), z_dir=(0, 0, -1))) as zaoblit3_piece_15:
        with BuildLine():
            CenterArc((ZAOBLIT3_R, ZAOBLIT3_R), ZAOBLIT3_R, 180, 90)
            Line((0, ZAOBLIT3_R), (0, 0))
            Line((0, 0), (ZAOBLIT3_R, 0))
        make_face()
    extrude(amount=22, mode=Mode.SUBTRACT)

    # Skica47 → Přidat vysunutím13 (add)
    with BuildSketch(Plane.XY.offset(-73.5)):
        with Locations((25.35, 19)):
            Circle(SKICA47_R)
        with Locations((74.65, 19)):
            Circle(SKICA47_R)
    extrude(amount=-P_IDAT_VYSUNUT_M13_DEPTH)

    # Skica47<3> → Odebrat vysunutím27 (cut)
    with BuildSketch(Plane.XY.offset(-73.5)):
        with Locations((25.35, 26)):
            Circle(SKICA47_3_R)
        with Locations((74.65, 26)):
            Circle(SKICA47_3_R)
    extrude(amount=-ODEBRAT_VYSUNUT_M27_DEPTH, mode=Mode.SUBTRACT)


solid = part.part
